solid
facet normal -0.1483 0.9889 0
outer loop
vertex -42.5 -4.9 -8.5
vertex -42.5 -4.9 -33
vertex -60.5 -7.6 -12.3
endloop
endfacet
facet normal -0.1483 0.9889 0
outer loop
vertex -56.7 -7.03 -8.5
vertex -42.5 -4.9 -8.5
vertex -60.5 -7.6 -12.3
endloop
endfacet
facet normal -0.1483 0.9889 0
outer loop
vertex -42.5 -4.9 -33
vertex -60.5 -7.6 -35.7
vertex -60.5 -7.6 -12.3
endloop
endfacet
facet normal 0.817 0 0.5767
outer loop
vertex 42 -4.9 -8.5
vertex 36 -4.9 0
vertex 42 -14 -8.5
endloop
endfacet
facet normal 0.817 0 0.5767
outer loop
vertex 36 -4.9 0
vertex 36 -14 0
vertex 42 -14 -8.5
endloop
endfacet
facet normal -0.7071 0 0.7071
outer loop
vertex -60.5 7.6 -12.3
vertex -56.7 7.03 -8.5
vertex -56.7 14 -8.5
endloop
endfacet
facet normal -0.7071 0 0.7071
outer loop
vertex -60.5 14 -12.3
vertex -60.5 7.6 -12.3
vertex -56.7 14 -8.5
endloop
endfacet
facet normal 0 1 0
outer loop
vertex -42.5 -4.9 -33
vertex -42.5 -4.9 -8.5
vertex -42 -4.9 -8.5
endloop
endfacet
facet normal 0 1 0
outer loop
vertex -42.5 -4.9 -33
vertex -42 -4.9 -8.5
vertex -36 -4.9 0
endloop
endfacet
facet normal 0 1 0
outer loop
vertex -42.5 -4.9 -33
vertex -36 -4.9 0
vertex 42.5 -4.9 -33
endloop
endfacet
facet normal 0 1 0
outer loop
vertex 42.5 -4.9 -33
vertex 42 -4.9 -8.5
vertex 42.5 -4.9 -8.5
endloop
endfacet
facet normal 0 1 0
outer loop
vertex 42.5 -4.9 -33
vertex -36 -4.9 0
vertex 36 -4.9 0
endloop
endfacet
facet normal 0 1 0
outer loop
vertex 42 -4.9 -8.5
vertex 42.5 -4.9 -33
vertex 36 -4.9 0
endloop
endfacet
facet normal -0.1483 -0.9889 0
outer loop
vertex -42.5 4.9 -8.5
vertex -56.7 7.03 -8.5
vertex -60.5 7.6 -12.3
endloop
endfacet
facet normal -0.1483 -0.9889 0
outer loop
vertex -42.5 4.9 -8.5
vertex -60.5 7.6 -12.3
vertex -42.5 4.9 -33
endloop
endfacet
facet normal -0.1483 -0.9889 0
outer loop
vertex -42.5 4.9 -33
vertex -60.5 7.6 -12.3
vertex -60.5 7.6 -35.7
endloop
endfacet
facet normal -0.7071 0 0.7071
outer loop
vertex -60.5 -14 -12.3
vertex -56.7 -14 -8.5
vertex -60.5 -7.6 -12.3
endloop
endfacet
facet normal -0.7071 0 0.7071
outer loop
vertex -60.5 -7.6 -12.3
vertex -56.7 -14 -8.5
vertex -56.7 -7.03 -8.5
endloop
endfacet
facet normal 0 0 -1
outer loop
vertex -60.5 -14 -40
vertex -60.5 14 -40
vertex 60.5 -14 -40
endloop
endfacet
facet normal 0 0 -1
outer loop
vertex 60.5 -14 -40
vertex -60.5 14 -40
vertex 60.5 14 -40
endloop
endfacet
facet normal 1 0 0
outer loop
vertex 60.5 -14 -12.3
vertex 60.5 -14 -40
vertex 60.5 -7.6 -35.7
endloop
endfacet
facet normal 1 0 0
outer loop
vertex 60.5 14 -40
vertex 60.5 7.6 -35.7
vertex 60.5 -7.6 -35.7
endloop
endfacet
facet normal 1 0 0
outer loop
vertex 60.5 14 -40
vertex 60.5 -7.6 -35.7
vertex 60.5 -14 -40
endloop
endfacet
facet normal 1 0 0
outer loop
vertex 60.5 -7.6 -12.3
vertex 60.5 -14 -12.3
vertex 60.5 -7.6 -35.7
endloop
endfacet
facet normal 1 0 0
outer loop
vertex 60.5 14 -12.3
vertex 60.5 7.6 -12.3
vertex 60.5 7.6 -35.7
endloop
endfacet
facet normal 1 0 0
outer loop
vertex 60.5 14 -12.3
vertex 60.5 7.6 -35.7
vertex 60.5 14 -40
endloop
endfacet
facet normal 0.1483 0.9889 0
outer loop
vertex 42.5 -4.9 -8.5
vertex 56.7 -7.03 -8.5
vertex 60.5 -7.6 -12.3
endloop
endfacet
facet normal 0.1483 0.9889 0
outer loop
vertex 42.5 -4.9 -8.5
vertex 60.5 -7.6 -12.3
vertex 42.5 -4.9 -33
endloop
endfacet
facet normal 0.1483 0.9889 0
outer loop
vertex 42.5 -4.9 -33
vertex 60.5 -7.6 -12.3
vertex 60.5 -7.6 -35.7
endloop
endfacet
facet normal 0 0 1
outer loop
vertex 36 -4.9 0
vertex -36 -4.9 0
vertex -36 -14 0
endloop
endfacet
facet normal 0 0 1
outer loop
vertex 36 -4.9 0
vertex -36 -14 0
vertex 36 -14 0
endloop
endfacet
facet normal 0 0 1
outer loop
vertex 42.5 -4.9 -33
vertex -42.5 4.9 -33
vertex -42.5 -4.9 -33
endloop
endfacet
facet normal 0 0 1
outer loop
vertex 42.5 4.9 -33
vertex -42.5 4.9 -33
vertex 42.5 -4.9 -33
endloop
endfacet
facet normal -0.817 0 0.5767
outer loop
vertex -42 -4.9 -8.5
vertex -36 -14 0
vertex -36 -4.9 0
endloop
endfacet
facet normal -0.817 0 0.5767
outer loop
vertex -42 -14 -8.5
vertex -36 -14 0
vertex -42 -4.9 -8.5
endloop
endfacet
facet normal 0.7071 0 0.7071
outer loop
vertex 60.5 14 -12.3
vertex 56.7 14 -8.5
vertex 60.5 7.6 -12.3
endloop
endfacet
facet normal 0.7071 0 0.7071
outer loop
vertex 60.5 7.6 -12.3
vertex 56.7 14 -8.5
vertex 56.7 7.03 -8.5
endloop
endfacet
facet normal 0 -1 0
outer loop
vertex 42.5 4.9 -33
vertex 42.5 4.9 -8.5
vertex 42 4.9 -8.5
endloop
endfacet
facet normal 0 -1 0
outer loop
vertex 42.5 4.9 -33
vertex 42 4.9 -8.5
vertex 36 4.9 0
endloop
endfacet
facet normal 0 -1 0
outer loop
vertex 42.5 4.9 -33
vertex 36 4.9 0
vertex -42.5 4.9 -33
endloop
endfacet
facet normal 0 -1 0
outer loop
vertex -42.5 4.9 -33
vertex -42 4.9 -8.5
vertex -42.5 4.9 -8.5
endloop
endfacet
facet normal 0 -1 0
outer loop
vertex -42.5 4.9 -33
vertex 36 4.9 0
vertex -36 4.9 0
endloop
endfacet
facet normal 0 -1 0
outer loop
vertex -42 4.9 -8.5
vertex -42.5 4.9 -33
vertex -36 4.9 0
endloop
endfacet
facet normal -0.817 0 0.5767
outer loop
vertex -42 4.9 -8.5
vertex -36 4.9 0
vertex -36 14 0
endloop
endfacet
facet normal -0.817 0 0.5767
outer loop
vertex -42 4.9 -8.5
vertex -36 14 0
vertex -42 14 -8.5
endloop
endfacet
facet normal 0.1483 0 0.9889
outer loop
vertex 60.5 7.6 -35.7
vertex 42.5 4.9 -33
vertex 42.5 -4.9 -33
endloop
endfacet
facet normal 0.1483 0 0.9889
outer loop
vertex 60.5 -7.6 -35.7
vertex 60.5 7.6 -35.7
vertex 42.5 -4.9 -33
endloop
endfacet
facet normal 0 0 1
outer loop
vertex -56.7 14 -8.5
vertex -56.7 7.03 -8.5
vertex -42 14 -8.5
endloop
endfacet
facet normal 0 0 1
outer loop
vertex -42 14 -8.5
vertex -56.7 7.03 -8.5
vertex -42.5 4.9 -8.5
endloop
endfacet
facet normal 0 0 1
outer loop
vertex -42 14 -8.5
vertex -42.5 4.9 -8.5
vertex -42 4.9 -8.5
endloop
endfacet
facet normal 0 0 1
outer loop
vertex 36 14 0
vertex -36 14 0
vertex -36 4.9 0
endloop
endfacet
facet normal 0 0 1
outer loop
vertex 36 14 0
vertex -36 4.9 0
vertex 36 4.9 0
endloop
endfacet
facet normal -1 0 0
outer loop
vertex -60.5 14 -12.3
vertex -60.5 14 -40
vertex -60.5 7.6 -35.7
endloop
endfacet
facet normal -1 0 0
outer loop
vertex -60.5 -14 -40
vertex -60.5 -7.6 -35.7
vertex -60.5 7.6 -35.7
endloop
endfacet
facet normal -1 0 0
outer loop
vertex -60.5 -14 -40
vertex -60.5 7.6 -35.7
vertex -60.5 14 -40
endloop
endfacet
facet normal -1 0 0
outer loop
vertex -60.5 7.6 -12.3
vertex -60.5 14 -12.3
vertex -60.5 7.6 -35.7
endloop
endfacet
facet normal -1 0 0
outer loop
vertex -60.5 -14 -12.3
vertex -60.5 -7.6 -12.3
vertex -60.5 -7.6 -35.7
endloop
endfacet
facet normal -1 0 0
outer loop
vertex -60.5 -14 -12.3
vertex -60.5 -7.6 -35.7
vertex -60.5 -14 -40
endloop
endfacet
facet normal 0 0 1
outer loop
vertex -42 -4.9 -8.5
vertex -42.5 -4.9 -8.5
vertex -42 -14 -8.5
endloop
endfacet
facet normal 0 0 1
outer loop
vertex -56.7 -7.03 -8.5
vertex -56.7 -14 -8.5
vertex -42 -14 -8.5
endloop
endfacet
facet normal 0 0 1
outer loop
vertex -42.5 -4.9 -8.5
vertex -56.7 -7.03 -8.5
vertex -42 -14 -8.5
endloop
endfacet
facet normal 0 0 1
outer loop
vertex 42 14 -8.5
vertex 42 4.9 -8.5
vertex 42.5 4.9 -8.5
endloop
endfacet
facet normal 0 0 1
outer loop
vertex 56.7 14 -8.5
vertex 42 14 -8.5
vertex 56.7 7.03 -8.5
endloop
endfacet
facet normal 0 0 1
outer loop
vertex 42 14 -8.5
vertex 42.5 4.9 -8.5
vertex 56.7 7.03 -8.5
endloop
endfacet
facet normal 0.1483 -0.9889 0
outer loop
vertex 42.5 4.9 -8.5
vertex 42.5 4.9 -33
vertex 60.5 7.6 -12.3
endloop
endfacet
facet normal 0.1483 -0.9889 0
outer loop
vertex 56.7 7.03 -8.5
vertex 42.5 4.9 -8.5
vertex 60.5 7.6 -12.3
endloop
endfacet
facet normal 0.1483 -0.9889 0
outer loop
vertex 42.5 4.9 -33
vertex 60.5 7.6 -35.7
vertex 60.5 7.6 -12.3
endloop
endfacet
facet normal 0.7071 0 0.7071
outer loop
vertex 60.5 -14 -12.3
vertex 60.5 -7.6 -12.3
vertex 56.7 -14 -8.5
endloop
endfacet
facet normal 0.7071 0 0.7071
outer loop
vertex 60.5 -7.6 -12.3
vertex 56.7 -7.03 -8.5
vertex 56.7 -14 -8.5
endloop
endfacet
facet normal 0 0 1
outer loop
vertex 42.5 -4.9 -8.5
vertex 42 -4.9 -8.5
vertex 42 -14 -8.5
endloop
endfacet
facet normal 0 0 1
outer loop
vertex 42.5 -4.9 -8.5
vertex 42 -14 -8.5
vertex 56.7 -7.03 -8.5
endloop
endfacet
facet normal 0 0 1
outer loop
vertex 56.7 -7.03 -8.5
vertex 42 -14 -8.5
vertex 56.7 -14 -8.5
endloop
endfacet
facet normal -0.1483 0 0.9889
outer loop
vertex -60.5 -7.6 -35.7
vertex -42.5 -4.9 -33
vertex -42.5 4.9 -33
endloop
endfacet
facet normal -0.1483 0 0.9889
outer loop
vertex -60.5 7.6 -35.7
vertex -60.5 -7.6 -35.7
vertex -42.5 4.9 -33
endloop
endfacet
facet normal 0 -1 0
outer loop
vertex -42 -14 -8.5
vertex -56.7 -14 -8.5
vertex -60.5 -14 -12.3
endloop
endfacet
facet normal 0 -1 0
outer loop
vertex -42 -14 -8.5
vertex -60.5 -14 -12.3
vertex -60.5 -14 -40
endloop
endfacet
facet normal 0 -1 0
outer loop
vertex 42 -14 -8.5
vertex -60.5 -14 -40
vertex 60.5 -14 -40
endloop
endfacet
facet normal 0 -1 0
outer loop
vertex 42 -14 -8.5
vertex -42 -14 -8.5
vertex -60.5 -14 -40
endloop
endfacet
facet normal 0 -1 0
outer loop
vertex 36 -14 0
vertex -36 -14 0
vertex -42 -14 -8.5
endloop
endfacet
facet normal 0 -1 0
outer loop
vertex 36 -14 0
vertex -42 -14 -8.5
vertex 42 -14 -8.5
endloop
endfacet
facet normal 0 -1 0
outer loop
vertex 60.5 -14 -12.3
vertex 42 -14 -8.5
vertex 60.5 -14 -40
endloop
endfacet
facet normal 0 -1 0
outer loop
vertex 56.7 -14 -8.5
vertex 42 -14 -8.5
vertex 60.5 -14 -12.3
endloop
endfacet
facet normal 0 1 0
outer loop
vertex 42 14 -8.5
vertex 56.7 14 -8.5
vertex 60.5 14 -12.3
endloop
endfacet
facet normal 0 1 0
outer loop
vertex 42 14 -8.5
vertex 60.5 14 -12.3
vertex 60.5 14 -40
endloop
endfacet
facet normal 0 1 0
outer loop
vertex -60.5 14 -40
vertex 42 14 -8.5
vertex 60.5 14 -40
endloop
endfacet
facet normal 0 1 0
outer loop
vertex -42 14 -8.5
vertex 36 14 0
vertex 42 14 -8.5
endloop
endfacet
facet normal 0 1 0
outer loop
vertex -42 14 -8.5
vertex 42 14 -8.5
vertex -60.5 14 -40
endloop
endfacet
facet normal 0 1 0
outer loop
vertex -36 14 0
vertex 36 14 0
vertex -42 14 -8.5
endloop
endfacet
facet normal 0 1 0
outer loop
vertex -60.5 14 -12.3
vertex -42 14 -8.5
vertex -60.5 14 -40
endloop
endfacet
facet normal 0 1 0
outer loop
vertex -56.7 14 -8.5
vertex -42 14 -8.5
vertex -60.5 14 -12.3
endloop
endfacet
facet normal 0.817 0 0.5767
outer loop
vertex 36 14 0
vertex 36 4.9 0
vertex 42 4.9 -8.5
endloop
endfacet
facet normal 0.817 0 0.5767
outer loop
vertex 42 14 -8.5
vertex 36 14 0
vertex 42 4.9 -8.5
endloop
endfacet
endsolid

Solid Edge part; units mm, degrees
sketch "Sketch1" plane through (0, 0, 0) normal (0, 0, 1) x (1, 0, 0)
  line L0 (-60.5, -14) -> (60.5, -14)
  line L1 (60.5, -14) -> (60.5, 14)
  line L2 (60.5, 14) -> (-60.5, 14)
  line L3 (-60.5, 14) -> (-60.5, -14)
extrude "Protrusion1" add sketch "Sketch1" against normal blind 40
sketch "Sketch2" plane through (0, -14, -20) normal (0, -1, 0) x (1, 0, 0)
  line L0 (60.5, 20) -> (42, 20)
  line L1 (42, 20) -> (42, 11.5)
  line L2 (42, 11.5) -> (60.5, 11.5)
  line L3 (60.5, 11.5) -> (60.5, 20)
extrude "ExtrudedCutout_11" cut sketch "Sketch2" against normal blind 28
sketch "Sketch3" plane through (0, -14, -20) normal (0, -1, 0) x (1, 0, 0)
  line L0 (-60.5, 11.5) -> (-42, 11.5)
  line L1 (-42, 11.5) -> (-42, 20)
  line L2 (-42, 20) -> (-60.5, 20)
  line L3 (-60.5, 20) -> (-60.5, 11.5)
extrude "ExtrudedCutout_12" cut sketch "Sketch3" against normal blind 28
chamfer "Chamfer_7" [suppressed]
chamfer "Chamfer_8" [suppressed]
sketch "Sketch4" plane through (0, 0, 0) normal (0, 0, 1) x (0, 1, 0)
  line L0 (-4.9, -60.5) -> (4.9, -60.5)
  line L1 (4.9, -60.5) -> (4.9, 60.5)
  line L2 (4.9, 60.5) -> (-4.9, 60.5)
  line L3 (-4.9, 60.5) -> (-4.9, -60.5)
extrude "ExtrudedCutout_28" cut sketch "Sketch4" against normal blind 33
chamfer "Chamfer_9" distance 18 distance2 2.7 1 edges at (-60.5, 0, -33) measured on face at (-41.5433, -3.1687, -33)
chamfer "Chamfer_10" distance 18 distance2 2.7 1 edges at (-60.5, -4.9, -22.1) measured on face at (-41.5433, -4.9, -29.393)
chamfer "Chamfer_11" distance 18 distance2 2.7 1 edges at (-60.5, 4.9, -22.1) measured on face at (41.5433, 4.9, -29.393)
chamfer "Chamfer_12" distance 18 distance2 2.7 1 edges at (60.5, 0, -33) measured on face at (-26.3633, -3.1687, -33)
chamfer "Chamfer_13" distance 18 distance2 2.7 1 edges at (60.5, 4.9, -22.1) measured on face at (44.3633, 4.9, -29.393)
chamfer "Chamfer_14" distance 18 distance2 2.7 1 edges at (60.5, -4.9, -22.1) measured on face at (-26.3633, -4.9, -29.393)
sketch "Sketch5" plane through (0, -14, -20) normal (0, -1, 0) x (1, 0, 0)
  line L0 (-36, 20) -> (-42, 11.5)
  line L1 (-42, 11.5) -> (-42, 20)
  line L2 (-42, 20) -> (-36, 20)
  line L3 (36, 20) -> (42, 11.5)
  line L4 (42, 11.5) -> (42, 20)
  line L5 (42, 20) -> (36, 20)
extrude "ExtrudedCutout_29" cut sketch "Sketch5" against normal blind 30
chamfer "Chamfer_15" distance 3.8 angle 45 4 edges at (60.5, 10.8, -8.5) (60.5, -10.8, -8.5) (-60.5, 10.8, -8.5) (-60.5, -10.8, -8.5)
